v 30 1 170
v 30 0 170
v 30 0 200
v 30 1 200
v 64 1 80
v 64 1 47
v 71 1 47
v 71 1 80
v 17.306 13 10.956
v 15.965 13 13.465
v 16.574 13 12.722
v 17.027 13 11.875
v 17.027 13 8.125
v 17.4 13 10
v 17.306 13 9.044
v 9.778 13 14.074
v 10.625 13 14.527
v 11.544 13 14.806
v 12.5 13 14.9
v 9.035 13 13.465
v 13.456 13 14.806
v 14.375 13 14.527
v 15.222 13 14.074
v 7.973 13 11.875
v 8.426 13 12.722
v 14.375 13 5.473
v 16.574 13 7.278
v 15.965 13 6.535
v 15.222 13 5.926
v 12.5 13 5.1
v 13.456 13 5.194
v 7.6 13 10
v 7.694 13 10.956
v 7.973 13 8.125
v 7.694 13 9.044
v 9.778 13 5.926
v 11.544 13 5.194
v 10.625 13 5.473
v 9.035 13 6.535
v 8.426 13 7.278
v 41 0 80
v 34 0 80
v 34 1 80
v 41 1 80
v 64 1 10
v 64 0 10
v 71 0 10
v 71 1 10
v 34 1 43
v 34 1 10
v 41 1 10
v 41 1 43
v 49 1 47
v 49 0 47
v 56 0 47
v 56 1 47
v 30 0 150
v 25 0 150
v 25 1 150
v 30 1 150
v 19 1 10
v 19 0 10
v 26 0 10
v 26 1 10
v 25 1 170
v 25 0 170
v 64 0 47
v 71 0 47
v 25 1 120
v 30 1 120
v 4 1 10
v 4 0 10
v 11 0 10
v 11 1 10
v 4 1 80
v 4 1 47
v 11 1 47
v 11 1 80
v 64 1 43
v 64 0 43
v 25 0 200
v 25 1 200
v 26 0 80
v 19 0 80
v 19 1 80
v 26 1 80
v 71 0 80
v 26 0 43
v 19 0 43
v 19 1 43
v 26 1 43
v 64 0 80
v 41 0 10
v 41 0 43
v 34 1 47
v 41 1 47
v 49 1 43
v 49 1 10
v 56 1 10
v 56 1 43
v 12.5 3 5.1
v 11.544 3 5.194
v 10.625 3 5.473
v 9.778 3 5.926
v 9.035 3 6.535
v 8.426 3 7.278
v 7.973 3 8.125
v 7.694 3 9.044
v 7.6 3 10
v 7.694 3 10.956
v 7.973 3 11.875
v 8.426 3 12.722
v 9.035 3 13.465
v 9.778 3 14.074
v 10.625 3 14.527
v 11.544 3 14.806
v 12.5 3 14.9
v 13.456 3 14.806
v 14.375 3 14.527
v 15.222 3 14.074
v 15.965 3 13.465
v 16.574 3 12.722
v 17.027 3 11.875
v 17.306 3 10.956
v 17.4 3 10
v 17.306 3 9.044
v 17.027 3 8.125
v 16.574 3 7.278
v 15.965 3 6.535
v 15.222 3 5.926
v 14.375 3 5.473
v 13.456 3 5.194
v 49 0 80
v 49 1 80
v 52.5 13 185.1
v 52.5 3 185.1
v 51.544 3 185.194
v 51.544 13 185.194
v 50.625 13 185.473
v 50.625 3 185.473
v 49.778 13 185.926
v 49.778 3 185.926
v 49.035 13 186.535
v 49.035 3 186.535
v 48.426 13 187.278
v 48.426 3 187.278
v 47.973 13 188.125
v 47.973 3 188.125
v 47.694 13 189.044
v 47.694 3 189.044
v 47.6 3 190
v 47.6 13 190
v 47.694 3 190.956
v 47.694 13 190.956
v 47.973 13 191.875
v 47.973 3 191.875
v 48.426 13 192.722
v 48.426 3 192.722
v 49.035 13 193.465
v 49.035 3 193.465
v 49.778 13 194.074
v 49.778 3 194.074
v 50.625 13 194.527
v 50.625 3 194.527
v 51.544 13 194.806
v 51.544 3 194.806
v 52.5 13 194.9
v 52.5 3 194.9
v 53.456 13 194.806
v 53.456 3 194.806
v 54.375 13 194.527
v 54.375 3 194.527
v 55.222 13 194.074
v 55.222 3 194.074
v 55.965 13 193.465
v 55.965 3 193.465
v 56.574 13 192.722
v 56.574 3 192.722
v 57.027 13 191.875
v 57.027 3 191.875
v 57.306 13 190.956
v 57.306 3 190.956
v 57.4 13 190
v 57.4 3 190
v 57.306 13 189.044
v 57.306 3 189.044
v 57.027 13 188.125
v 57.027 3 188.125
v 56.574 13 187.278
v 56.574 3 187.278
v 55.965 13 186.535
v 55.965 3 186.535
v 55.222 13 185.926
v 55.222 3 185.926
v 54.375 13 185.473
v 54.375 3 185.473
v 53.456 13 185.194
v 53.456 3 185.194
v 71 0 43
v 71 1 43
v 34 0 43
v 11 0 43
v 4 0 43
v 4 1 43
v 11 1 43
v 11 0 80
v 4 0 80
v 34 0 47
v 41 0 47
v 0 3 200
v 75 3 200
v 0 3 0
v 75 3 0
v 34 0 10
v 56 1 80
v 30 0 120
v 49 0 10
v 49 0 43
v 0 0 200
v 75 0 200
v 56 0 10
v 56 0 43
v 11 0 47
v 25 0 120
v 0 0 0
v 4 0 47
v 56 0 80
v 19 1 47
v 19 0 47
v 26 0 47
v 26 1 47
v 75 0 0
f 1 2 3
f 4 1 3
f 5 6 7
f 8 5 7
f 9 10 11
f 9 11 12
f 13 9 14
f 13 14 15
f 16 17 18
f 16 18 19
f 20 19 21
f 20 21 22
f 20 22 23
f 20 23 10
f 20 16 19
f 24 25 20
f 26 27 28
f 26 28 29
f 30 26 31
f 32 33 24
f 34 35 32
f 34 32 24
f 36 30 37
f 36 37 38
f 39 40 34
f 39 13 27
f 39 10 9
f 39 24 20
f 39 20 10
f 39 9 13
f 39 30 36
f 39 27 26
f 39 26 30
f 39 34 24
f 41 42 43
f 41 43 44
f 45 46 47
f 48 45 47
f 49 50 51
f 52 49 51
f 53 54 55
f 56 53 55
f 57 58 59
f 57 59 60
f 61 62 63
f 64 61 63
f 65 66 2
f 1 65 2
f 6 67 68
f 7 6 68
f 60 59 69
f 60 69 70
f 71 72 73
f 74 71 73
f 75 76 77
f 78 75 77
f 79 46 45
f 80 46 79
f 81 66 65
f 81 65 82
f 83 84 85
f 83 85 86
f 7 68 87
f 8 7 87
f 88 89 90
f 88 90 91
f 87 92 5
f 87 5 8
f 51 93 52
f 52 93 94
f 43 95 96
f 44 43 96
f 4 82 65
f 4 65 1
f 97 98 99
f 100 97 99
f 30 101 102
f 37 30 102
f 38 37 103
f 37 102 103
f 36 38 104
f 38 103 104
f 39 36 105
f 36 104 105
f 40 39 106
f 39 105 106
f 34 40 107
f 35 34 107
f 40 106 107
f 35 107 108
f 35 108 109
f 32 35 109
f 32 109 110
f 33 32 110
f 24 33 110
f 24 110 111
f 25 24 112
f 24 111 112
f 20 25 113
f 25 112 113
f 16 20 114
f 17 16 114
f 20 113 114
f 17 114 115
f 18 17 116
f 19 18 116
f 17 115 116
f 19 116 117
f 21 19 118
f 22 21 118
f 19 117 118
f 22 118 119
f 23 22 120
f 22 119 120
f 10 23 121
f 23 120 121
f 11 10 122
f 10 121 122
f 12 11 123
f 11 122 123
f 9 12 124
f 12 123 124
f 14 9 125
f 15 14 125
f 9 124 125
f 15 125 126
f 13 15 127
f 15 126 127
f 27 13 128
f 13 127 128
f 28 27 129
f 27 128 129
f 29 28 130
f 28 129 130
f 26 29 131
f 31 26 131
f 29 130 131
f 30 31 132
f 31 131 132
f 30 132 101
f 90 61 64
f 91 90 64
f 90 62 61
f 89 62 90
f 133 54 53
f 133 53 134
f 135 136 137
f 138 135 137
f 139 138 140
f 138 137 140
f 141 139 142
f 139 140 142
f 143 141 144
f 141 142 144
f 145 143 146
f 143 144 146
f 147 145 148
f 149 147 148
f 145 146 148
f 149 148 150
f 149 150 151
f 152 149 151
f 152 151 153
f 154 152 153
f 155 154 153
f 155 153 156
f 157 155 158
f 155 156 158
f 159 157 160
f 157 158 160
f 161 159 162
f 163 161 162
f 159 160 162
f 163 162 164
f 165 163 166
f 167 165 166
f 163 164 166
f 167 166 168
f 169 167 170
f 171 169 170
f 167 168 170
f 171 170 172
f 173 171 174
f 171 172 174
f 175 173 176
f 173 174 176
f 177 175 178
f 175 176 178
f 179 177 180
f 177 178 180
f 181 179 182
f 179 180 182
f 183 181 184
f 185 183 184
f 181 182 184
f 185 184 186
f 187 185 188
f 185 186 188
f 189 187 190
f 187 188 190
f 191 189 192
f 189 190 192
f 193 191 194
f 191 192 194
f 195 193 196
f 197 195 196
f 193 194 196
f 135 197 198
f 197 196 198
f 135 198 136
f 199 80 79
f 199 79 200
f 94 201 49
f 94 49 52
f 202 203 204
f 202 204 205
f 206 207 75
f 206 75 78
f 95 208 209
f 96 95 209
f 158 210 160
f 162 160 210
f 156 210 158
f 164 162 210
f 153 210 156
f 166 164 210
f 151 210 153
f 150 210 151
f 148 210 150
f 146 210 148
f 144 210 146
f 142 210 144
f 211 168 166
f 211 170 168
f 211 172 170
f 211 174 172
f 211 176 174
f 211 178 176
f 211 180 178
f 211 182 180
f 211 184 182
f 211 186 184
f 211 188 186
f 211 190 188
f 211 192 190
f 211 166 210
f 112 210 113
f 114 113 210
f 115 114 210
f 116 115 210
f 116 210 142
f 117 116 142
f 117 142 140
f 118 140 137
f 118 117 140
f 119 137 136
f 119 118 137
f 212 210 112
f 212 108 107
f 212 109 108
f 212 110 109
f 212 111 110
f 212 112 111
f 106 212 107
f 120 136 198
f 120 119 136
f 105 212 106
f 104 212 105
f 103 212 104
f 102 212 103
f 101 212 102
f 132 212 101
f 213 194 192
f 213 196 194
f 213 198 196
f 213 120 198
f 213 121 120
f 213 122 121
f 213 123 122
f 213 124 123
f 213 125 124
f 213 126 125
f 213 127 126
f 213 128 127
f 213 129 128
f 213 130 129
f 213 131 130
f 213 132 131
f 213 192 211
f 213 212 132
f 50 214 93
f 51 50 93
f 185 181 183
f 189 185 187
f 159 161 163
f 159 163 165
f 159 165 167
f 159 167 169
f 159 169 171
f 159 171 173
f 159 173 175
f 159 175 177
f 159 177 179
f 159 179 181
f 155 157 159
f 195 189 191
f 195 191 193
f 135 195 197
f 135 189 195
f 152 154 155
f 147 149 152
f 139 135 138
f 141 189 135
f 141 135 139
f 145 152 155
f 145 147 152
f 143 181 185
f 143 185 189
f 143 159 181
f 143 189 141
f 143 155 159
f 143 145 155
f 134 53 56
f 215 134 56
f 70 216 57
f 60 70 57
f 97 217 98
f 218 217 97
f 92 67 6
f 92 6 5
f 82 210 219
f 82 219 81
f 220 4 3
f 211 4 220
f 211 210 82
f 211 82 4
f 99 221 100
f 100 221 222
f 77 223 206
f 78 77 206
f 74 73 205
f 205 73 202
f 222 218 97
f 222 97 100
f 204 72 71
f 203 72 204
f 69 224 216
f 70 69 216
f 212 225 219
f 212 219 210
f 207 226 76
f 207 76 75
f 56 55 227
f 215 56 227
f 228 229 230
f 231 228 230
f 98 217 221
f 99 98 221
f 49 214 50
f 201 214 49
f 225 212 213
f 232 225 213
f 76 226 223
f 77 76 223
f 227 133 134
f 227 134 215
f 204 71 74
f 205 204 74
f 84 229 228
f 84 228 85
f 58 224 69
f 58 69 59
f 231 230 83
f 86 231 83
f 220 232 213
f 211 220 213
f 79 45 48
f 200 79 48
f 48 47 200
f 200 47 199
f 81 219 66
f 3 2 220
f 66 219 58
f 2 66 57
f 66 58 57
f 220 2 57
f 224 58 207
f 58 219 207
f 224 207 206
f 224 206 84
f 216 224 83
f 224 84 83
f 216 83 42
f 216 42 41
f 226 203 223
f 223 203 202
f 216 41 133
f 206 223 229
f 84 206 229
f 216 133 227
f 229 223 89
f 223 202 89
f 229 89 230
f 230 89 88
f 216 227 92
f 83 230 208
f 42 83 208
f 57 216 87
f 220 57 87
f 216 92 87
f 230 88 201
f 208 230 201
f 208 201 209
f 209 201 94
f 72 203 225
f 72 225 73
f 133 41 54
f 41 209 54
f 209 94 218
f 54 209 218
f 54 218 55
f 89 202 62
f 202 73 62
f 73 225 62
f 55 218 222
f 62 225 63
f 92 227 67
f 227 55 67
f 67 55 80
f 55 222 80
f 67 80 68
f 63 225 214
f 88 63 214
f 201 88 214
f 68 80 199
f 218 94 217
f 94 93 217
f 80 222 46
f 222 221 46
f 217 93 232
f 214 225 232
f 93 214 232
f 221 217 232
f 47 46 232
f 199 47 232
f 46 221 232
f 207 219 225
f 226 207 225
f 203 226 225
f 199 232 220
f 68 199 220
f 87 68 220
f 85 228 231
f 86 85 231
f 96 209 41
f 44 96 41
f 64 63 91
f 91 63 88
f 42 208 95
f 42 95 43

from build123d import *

# Parameters (mm, degrees)
SKETCH1_W           = 75
SKETCH1_H           = 3
BOSS_EXTRUDE1_DEPTH = 200
SKETCH2_R           = 4.9
BOSS_EXTRUDE2_DEPTH = 10
SKETCH3_W           = 7
SKETCH3_H           = 33
SKETCH3_W_2         = 5
SKETCH3_H_2         = 30
CUT_EXTRUDE1_DEPTH  = 1


with BuildPart() as part:
    # Sketch1 → Boss-Extrude1 (new body)
    with BuildSketch(Plane.XY):
        with Locations((37.5, 1.5)):
            Rectangle(SKETCH1_W, SKETCH1_H)
    extrude(amount=BOSS_EXTRUDE1_DEPTH)

    # Sketch2 → Boss-Extrude2 (add)
    with BuildSketch(Plane(origin=(0, 3, 0), x_dir=(1, 0, 0), z_dir=(0, 1, 0))):
        with Locations(Location((12.5, -10, 0), (0, 0, 90))):
            Circle(SKETCH2_R)
        with Locations(Location((52.5, -190, 0), (0, 0, 90))):
            Circle(SKETCH2_R)
    extrude(amount=BOSS_EXTRUDE2_DEPTH)

    # Sketch3 → Cut-Extrude1 (cut)
    with BuildSketch(Plane.XZ):
        with Locations((7.5, 26.5)):
            Rectangle(SKETCH3_W, SKETCH3_H)
        with Locations((7.5, 63.5)):
            Rectangle(SKETCH3_W, SKETCH3_H)
        with Locations((27.5, 135)):
            Rectangle(SKETCH3_W_2, SKETCH3_H_2)
        with Locations((22.5, 26.5)):
            Rectangle(SKETCH3_W, SKETCH3_H)
        with Locations((22.5, 63.5)):
            Rectangle(SKETCH3_W, SKETCH3_H)
        with Locations((37.5, 26.5)):
            Rectangle(SKETCH3_W, SKETCH3_H)
        with Locations((37.5, 63.5)):
            Rectangle(SKETCH3_W, SKETCH3_H)
        with Locations((52.5, 26.5)):
            Rectangle(SKETCH3_W, SKETCH3_H)
        with Locations((52.5, 63.5)):
            Rectangle(SKETCH3_W, SKETCH3_H)
        with Locations((67.5, 26.5)):
            Rectangle(SKETCH3_W, SKETCH3_H)
        with Locations((67.5, 63.5)):
            Rectangle(SKETCH3_W, SKETCH3_H)
        with Locations((27.5, 185)):
            Rectangle(SKETCH3_W_2, SKETCH3_H_2)
    extrude(amount=-CUT_EXTRUDE1_DEPTH, mode=Mode.SUBTRACT)


solid = part.part
